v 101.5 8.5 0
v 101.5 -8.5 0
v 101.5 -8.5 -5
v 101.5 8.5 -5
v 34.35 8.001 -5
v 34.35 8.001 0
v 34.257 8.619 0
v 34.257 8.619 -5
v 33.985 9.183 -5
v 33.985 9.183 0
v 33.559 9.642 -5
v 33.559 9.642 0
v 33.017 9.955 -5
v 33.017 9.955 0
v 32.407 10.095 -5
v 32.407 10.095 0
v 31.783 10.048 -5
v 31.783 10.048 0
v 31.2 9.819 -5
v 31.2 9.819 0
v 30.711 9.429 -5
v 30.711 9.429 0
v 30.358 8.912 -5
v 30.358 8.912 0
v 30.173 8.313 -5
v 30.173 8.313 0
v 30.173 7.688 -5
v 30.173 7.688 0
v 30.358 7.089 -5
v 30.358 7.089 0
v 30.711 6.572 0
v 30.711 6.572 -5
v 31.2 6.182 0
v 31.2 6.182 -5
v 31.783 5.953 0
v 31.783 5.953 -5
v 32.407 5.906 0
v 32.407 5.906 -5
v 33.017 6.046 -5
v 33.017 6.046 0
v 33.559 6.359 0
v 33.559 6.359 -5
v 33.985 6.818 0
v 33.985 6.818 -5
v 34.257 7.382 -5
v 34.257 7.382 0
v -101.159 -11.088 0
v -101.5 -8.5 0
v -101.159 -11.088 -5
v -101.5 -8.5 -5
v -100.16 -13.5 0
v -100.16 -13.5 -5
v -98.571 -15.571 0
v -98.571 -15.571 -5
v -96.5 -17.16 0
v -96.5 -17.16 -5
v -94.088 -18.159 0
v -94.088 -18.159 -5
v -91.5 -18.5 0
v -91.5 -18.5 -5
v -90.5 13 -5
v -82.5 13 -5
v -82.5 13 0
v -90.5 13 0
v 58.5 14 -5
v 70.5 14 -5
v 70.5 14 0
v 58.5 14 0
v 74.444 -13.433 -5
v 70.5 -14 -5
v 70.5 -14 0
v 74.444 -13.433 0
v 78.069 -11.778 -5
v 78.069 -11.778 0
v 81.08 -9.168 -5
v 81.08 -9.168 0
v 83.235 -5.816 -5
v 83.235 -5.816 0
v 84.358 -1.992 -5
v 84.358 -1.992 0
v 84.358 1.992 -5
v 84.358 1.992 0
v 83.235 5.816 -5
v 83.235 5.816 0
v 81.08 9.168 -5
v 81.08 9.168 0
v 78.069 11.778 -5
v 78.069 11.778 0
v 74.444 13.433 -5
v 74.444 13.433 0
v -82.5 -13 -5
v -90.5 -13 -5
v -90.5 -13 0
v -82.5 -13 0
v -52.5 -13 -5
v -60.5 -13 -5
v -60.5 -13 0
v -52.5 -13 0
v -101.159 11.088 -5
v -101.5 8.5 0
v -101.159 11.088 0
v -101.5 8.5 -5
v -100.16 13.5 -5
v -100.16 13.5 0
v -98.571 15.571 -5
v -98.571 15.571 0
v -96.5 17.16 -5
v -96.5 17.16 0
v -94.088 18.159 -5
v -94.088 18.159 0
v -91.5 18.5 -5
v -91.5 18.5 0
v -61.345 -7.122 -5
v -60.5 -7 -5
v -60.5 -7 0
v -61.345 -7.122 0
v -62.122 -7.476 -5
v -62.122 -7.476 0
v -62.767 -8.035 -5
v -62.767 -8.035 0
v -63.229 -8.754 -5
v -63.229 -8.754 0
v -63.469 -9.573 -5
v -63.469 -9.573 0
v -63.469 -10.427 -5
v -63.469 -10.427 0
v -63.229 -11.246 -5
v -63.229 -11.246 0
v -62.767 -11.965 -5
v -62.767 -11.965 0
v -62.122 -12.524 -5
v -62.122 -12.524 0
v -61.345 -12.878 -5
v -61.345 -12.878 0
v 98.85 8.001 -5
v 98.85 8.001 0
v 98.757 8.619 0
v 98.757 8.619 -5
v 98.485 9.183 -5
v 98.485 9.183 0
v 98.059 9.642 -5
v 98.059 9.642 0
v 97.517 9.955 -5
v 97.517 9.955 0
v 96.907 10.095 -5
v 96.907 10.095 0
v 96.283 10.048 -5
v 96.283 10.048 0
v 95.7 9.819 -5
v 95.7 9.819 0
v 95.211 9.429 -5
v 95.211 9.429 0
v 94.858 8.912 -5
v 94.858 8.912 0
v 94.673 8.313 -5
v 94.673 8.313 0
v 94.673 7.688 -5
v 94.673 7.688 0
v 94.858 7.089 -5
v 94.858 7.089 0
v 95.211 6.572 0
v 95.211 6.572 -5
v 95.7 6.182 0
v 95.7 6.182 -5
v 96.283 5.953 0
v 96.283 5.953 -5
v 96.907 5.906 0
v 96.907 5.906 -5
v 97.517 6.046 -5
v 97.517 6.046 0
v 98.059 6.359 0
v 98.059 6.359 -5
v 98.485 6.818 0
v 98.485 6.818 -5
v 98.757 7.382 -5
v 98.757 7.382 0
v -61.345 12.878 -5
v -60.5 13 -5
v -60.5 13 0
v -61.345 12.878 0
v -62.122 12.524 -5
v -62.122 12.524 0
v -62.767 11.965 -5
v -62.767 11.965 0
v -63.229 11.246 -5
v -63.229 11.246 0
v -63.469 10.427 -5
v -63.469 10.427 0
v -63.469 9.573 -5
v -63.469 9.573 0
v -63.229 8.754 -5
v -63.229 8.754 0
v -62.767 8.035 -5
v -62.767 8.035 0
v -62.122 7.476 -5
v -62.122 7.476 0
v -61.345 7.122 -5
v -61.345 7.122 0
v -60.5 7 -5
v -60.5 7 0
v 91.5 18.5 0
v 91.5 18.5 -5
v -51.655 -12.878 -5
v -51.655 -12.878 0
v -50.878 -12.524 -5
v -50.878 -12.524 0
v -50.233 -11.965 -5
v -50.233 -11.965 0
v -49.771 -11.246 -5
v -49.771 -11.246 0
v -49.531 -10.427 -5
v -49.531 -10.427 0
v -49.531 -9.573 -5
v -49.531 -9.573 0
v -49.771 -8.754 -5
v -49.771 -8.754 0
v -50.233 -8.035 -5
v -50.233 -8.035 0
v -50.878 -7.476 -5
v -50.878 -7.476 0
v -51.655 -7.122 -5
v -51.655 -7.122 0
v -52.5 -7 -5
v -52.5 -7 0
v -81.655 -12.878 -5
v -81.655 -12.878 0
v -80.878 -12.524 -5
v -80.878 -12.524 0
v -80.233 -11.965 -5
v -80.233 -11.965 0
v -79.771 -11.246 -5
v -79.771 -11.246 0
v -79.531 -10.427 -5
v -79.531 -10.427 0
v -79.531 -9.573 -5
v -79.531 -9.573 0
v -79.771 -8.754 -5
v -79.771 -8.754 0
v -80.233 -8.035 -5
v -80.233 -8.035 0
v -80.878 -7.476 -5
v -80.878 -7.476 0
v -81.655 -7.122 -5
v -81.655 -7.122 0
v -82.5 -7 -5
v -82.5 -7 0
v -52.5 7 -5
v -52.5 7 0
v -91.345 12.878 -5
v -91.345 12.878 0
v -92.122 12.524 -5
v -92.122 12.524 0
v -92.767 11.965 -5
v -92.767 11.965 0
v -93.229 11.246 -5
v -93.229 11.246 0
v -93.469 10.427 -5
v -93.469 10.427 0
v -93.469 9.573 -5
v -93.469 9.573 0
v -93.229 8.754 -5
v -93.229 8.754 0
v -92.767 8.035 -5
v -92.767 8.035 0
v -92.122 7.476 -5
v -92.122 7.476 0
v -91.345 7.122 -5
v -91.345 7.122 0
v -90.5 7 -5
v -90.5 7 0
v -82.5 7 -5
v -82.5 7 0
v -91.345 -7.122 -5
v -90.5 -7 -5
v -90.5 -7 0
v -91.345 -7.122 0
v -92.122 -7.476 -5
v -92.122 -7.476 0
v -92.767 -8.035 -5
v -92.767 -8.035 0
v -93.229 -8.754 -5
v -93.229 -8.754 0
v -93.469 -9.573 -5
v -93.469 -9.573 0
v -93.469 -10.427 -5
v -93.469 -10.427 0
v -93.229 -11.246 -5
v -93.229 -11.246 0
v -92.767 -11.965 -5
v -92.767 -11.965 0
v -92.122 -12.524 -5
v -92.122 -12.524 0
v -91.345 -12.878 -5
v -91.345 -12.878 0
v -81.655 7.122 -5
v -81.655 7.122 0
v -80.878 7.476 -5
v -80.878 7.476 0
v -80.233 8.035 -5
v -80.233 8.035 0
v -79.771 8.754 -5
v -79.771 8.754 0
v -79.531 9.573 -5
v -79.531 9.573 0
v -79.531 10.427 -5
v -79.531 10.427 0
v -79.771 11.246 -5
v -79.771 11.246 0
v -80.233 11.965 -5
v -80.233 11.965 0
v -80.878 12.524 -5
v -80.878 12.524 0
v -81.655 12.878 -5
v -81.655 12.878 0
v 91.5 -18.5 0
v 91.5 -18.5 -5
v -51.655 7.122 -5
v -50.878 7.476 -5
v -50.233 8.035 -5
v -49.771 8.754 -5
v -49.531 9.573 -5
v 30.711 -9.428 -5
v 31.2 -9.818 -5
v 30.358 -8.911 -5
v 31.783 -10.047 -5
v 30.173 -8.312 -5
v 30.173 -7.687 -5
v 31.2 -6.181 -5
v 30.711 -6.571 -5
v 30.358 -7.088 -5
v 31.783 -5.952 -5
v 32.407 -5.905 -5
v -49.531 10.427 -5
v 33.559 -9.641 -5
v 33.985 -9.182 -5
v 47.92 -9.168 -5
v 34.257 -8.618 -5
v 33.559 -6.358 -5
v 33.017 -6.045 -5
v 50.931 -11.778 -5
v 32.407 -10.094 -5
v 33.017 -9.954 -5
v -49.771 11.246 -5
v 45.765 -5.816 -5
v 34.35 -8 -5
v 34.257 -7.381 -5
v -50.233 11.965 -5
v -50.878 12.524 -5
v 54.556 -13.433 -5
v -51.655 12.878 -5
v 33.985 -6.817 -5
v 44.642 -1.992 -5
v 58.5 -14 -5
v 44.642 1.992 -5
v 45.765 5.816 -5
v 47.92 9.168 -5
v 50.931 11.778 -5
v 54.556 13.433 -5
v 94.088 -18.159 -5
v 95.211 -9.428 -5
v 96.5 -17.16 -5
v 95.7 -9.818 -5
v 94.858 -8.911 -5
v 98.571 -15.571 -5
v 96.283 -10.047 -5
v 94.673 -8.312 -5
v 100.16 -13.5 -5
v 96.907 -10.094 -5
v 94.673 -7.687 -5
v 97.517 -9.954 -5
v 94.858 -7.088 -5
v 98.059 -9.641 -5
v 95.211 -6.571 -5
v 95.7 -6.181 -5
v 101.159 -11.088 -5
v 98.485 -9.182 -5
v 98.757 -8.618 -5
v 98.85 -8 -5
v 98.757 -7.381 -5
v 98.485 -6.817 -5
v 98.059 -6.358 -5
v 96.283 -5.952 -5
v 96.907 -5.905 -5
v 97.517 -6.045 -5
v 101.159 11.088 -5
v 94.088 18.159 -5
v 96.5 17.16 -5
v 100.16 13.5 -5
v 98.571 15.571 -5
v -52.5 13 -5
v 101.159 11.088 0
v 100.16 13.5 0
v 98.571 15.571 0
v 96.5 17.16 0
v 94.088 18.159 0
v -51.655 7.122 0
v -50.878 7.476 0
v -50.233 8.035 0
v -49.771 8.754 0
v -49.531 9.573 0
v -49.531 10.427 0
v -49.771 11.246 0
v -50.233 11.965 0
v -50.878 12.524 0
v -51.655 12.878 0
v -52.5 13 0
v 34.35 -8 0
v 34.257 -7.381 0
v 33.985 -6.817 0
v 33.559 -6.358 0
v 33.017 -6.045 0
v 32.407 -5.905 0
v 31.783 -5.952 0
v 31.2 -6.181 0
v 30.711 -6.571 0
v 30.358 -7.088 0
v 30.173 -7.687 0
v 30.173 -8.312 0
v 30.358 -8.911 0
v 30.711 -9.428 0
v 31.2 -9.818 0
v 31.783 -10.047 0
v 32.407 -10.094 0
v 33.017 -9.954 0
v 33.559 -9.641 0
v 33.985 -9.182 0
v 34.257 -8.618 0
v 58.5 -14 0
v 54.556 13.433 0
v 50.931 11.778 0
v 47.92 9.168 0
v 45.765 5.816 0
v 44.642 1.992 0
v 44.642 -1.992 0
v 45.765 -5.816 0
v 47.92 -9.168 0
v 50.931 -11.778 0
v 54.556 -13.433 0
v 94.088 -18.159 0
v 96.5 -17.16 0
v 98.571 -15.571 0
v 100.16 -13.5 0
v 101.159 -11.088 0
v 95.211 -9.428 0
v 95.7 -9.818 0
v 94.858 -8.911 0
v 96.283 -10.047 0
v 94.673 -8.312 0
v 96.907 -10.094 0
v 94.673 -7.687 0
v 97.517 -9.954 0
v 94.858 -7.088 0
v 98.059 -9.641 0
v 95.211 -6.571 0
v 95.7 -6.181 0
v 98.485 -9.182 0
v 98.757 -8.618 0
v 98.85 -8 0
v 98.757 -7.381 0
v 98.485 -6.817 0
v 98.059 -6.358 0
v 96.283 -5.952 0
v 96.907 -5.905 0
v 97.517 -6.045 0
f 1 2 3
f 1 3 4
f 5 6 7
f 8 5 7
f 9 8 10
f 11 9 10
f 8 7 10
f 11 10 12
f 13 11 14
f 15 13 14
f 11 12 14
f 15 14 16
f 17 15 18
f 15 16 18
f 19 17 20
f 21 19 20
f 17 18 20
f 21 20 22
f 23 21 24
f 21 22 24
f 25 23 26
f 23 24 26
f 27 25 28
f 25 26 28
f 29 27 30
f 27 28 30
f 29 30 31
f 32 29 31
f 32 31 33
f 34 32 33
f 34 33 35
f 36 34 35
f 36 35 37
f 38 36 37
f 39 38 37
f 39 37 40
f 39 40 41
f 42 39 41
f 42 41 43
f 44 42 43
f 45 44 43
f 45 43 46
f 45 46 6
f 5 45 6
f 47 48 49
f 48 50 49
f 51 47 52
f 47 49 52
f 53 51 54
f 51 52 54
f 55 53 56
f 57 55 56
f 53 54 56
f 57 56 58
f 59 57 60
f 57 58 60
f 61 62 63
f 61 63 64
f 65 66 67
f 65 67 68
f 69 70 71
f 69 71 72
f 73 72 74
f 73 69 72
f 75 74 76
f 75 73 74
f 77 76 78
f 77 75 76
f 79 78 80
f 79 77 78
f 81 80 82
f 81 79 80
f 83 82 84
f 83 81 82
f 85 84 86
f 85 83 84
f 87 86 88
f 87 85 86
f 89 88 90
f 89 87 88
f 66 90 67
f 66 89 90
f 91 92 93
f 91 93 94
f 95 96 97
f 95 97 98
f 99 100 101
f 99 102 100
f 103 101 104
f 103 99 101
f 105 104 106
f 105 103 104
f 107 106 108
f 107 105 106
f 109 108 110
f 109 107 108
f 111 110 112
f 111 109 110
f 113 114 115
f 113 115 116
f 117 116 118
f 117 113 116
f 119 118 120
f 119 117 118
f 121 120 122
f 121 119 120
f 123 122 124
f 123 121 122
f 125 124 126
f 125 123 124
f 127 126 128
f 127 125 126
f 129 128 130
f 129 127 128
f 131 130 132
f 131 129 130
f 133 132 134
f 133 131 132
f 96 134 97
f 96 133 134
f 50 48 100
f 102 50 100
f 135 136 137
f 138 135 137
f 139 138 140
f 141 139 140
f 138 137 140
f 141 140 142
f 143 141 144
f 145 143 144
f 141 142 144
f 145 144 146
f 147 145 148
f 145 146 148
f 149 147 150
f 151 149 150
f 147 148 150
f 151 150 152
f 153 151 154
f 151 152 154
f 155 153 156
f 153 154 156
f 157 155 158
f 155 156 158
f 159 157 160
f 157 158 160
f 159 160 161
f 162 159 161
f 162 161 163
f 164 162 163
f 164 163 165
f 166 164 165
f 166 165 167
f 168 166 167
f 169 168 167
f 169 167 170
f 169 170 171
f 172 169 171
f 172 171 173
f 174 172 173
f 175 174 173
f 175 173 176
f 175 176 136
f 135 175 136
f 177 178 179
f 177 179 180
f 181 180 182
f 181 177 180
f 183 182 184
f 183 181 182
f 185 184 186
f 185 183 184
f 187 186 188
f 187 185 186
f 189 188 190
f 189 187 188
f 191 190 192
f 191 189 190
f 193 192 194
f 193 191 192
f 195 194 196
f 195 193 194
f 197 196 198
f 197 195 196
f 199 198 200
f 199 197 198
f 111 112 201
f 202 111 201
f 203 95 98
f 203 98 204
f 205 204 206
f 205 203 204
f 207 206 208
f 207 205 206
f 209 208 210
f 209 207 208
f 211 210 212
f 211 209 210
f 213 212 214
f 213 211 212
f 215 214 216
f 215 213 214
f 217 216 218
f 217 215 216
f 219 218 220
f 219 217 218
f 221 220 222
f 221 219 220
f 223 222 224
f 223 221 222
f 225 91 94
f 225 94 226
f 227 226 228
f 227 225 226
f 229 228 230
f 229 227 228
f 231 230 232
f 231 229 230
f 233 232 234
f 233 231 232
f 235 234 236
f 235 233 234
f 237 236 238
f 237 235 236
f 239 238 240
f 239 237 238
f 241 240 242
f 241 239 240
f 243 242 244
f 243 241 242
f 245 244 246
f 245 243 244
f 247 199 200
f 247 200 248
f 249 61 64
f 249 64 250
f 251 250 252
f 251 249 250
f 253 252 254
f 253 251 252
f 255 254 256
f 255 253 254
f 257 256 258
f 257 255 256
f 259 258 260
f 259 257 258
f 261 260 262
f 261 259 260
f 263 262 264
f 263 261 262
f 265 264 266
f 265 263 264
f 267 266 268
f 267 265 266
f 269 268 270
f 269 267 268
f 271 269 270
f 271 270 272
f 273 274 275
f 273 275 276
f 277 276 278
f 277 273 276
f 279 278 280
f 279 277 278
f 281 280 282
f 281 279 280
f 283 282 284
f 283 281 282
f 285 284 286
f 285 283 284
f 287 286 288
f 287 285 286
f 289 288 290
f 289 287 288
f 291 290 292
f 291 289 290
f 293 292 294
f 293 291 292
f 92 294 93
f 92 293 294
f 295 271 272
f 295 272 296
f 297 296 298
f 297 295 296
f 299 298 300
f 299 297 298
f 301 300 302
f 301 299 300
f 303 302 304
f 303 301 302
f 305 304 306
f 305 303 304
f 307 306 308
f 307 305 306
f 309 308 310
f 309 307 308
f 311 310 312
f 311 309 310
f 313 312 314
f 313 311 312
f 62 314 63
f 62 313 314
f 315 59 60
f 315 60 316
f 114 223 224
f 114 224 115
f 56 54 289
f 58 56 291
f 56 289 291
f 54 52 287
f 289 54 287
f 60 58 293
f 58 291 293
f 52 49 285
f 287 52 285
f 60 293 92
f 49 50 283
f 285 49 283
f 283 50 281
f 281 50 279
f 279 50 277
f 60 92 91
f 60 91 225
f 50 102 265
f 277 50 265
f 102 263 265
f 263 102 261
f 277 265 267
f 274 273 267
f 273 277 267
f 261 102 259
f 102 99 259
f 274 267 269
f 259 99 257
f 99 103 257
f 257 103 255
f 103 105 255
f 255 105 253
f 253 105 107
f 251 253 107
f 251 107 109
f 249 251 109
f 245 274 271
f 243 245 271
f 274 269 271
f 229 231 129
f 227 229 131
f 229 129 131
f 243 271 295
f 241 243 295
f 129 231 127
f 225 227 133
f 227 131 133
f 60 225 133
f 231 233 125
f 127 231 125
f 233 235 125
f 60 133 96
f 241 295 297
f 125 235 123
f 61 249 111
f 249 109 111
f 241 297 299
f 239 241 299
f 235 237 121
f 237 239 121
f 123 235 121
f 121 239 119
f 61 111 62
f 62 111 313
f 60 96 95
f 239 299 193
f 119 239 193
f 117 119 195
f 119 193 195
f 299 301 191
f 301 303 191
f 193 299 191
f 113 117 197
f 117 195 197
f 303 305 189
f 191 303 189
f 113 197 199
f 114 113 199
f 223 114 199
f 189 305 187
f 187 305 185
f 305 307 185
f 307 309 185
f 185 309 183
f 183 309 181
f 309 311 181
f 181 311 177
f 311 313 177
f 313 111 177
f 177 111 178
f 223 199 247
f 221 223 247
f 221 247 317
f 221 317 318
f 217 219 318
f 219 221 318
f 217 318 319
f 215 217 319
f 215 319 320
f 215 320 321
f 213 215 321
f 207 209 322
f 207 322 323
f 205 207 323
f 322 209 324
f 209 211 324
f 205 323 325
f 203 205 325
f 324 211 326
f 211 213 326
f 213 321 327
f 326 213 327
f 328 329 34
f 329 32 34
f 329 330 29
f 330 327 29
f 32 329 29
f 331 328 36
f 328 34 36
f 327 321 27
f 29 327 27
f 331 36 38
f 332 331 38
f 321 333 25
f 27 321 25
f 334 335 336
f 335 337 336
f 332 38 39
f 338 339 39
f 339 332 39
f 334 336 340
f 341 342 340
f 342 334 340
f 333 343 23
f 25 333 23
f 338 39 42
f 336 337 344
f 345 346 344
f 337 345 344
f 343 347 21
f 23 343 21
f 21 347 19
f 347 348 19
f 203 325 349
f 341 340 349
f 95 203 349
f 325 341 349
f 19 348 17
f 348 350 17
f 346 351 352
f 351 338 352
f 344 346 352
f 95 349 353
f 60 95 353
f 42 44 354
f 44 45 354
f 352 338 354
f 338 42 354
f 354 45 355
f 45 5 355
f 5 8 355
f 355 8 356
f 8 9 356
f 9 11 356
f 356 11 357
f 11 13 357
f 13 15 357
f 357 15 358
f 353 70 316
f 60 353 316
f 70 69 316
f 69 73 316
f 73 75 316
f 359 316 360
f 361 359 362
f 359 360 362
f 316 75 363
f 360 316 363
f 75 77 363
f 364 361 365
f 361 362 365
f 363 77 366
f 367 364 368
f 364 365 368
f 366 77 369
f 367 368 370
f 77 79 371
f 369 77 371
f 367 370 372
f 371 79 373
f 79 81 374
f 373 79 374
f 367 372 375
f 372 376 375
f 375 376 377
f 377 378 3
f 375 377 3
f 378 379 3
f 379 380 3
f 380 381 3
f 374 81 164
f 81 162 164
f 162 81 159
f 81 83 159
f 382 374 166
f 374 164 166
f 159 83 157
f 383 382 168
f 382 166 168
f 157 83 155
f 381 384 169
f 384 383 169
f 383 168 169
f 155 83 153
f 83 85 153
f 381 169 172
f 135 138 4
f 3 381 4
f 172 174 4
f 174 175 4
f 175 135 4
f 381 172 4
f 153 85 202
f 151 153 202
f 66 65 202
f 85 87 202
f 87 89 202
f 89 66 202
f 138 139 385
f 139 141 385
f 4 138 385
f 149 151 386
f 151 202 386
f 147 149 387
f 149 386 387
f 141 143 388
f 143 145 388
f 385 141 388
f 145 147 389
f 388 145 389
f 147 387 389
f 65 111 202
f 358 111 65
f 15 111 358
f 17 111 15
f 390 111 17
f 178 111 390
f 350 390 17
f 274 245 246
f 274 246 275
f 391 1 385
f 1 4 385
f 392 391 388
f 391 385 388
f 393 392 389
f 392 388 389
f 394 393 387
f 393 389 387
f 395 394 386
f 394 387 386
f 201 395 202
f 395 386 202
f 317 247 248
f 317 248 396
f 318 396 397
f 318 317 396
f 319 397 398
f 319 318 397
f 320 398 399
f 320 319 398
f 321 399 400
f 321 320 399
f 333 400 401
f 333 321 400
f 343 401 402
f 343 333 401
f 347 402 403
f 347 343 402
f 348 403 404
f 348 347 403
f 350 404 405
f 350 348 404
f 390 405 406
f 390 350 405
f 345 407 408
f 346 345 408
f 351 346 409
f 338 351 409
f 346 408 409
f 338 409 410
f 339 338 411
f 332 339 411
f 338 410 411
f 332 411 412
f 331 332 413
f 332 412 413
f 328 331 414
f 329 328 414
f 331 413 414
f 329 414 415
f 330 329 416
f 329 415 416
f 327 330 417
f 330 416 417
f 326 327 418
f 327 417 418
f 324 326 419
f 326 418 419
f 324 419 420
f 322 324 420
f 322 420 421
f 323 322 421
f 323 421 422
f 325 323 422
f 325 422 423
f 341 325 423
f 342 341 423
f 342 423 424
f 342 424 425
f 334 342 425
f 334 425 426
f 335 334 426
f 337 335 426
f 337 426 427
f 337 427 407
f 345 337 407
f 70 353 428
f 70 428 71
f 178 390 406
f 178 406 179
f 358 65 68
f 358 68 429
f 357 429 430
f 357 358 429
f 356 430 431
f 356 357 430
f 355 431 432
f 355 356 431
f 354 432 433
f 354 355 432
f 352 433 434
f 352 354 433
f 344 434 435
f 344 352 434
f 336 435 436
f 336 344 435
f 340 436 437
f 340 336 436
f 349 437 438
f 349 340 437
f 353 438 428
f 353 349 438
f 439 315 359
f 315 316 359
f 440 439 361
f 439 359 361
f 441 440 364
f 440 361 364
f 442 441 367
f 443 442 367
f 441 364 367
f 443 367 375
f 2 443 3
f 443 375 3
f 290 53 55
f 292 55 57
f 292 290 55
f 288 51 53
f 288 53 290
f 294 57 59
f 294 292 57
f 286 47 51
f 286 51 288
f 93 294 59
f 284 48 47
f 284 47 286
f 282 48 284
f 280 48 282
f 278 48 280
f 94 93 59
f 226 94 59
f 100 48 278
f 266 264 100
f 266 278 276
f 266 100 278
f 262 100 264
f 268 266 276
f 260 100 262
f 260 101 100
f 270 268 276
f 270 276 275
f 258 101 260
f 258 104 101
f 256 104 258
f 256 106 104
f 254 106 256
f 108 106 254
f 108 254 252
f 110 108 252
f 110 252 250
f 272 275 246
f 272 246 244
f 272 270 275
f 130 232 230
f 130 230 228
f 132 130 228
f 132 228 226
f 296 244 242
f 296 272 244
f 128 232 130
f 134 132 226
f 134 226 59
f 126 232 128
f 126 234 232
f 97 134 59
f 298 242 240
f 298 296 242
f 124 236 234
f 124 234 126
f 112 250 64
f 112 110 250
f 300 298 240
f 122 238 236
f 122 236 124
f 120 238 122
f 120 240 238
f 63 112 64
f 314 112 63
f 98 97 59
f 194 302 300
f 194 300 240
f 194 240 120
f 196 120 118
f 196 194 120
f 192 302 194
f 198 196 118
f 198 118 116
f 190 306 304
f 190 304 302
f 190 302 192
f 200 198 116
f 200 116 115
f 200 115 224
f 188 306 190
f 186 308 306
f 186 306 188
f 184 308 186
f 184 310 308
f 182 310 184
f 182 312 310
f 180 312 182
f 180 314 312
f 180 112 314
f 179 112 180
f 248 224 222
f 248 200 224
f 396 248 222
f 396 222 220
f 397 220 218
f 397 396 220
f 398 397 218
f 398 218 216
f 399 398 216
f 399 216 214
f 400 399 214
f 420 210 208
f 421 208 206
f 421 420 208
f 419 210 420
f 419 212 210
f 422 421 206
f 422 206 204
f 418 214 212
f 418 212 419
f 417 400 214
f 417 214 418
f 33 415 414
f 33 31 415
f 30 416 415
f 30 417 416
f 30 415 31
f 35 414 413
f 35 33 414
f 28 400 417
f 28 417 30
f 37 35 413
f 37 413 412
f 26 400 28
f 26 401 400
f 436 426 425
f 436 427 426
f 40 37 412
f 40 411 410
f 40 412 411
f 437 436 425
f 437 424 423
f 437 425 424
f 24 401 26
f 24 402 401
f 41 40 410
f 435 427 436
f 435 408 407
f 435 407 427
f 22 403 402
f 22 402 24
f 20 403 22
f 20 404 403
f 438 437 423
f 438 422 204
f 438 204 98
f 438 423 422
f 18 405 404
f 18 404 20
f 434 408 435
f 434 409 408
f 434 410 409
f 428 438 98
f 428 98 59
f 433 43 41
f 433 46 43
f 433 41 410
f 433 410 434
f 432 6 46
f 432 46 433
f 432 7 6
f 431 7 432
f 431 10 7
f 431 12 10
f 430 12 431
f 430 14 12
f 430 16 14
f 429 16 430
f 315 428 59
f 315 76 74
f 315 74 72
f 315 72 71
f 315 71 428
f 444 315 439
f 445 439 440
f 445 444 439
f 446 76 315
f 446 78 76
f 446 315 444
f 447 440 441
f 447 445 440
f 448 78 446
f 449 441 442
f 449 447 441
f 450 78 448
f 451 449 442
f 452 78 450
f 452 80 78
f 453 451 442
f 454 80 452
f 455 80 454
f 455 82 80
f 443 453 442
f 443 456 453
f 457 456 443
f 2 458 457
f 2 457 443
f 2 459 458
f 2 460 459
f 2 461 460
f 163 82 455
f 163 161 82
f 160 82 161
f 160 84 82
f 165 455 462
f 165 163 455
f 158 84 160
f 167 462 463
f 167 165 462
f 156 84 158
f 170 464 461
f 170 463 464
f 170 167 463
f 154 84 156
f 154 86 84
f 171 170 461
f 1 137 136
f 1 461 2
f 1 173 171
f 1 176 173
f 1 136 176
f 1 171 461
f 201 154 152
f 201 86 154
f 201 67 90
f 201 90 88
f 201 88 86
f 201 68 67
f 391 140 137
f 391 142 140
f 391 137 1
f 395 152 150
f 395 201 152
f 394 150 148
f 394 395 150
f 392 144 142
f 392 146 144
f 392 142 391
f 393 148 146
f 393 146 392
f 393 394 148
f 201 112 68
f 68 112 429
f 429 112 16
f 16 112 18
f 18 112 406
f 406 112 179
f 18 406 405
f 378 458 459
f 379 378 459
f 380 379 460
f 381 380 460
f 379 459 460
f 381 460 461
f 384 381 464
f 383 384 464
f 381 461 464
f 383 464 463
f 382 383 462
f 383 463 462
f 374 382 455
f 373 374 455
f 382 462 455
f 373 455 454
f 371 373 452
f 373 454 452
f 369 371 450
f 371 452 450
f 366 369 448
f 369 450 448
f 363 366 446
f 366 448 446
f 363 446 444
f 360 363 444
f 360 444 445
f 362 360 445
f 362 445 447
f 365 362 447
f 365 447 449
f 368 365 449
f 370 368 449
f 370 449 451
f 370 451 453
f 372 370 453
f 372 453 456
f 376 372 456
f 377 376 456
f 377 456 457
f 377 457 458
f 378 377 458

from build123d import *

# Parameters (mm, degrees)
SKETCH_1_W             = 203
SKETCH_1_H             = 37
SM_BASE_FLANGE_1_DEPTH = 5
FILLET_1_R             = 10
CUT_EXTRUDE_1_DEPTH    = 10
CUT_EXTRUDE_2_DEPTH    = 10
HOLE_WIZARD_M5_1_D     = 4.2
HOLE_WIZARD_M5_1_DEPTH = 12.4
HOLE_WIZARD_M5_1_TIP   = 1.2618073


# Sheet-metal steps are written as plain solids
with BuildPart() as part:
    # Sketch 1 → 基体-法兰1 (new body)
    with BuildSketch(Plane.XY):
        Rectangle(SKETCH_1_W, SKETCH_1_H)
    extrude(amount=-SM_BASE_FLANGE_1_DEPTH)

    # 圆角1
    fillet_1_edges = [part.edges().sort_by_distance(p)[0] for p in [
        (101.5, -18.5, -2.5),
        (-101.5, -18.5, -2.5),
        (-101.5, 18.5, -2.5),
        (101.5, 18.5, -2.5),
    ]]
    fillet(fillet_1_edges, radius=FILLET_1_R)

    # Sketch 2 → 切除-拉伸1 (cut)
    with BuildSketch(Plane(origin=(0, 0, -5), x_dir=(-1, 0, 0), z_dir=(0, 0, -1))):
        with BuildLine():
            Line((-58.5, -14), (-70.5, -14))
            ThreePointArc((-70.5, -14), (-84.5, 0), (-70.5, 14))
            Line((-70.5, 14), (-58.5, 14))
            ThreePointArc((-58.5, 14), (-44.5, 0), (-58.5, -14))
        make_face()
    extrude(amount=-CUT_EXTRUDE_1_DEPTH, mode=Mode.SUBTRACT)

    # 草图3 → 切除-拉伸2 (cut)
    with BuildSketch(Plane(origin=(0, 0, -5), x_dir=(-1, 0, 0), z_dir=(0, 0, -1))):
        with BuildLine():
            Line((60.5, -13), (52.5, -13))
            ThreePointArc((52.5, -13), (49.5, -10), (52.5, -7))
            Line((52.5, -7), (60.5, -7))
            ThreePointArc((60.5, -7), (63.5, -10), (60.5, -13))
        make_face()
        with BuildLine():
            Line((60.5, 7), (52.5, 7))
            ThreePointArc((52.5, 7), (49.5, 10), (52.5, 13))
            Line((52.5, 13), (60.5, 13))
            ThreePointArc((60.5, 13), (63.5, 10), (60.5, 7))
        make_face()
        with BuildLine():
            Line((82.5, 13), (90.5, 13))
            ThreePointArc((90.5, 13), (93.5, 10), (90.5, 7))
            Line((90.5, 7), (82.5, 7))
            ThreePointArc((82.5, 7), (79.5, 10), (82.5, 13))
        make_face()
        with BuildLine():
            Line((82.5, -7), (90.5, -7))
            ThreePointArc((90.5, -7), (93.5, -10), (90.5, -13))
            Line((90.5, -13), (82.5, -13))
            ThreePointArc((82.5, -13), (79.5, -10), (82.5, -7))
        make_face()
    extrude(amount=-CUT_EXTRUDE_2_DEPTH, mode=Mode.SUBTRACT)

    # M5 螺纹孔1
    with Locations(Plane(origin=(0, 0, -5), x_dir=(-1, 0, 0), z_dir=(0, 0, -1))):
        with Locations((-96.75, -7.9995), (-96.75, 8.0005), (-32.25, 8.0005), (-32.25, -7.9995)):
            Hole(HOLE_WIZARD_M5_1_D / 2, depth=HOLE_WIZARD_M5_1_DEPTH)
            with Locations((0, 0, -(HOLE_WIZARD_M5_1_DEPTH + HOLE_WIZARD_M5_1_TIP / 2))):  # 118° drill point
                Cone(0, HOLE_WIZARD_M5_1_D / 2, HOLE_WIZARD_M5_1_TIP, mode=Mode.SUBTRACT)


solid = part.part
